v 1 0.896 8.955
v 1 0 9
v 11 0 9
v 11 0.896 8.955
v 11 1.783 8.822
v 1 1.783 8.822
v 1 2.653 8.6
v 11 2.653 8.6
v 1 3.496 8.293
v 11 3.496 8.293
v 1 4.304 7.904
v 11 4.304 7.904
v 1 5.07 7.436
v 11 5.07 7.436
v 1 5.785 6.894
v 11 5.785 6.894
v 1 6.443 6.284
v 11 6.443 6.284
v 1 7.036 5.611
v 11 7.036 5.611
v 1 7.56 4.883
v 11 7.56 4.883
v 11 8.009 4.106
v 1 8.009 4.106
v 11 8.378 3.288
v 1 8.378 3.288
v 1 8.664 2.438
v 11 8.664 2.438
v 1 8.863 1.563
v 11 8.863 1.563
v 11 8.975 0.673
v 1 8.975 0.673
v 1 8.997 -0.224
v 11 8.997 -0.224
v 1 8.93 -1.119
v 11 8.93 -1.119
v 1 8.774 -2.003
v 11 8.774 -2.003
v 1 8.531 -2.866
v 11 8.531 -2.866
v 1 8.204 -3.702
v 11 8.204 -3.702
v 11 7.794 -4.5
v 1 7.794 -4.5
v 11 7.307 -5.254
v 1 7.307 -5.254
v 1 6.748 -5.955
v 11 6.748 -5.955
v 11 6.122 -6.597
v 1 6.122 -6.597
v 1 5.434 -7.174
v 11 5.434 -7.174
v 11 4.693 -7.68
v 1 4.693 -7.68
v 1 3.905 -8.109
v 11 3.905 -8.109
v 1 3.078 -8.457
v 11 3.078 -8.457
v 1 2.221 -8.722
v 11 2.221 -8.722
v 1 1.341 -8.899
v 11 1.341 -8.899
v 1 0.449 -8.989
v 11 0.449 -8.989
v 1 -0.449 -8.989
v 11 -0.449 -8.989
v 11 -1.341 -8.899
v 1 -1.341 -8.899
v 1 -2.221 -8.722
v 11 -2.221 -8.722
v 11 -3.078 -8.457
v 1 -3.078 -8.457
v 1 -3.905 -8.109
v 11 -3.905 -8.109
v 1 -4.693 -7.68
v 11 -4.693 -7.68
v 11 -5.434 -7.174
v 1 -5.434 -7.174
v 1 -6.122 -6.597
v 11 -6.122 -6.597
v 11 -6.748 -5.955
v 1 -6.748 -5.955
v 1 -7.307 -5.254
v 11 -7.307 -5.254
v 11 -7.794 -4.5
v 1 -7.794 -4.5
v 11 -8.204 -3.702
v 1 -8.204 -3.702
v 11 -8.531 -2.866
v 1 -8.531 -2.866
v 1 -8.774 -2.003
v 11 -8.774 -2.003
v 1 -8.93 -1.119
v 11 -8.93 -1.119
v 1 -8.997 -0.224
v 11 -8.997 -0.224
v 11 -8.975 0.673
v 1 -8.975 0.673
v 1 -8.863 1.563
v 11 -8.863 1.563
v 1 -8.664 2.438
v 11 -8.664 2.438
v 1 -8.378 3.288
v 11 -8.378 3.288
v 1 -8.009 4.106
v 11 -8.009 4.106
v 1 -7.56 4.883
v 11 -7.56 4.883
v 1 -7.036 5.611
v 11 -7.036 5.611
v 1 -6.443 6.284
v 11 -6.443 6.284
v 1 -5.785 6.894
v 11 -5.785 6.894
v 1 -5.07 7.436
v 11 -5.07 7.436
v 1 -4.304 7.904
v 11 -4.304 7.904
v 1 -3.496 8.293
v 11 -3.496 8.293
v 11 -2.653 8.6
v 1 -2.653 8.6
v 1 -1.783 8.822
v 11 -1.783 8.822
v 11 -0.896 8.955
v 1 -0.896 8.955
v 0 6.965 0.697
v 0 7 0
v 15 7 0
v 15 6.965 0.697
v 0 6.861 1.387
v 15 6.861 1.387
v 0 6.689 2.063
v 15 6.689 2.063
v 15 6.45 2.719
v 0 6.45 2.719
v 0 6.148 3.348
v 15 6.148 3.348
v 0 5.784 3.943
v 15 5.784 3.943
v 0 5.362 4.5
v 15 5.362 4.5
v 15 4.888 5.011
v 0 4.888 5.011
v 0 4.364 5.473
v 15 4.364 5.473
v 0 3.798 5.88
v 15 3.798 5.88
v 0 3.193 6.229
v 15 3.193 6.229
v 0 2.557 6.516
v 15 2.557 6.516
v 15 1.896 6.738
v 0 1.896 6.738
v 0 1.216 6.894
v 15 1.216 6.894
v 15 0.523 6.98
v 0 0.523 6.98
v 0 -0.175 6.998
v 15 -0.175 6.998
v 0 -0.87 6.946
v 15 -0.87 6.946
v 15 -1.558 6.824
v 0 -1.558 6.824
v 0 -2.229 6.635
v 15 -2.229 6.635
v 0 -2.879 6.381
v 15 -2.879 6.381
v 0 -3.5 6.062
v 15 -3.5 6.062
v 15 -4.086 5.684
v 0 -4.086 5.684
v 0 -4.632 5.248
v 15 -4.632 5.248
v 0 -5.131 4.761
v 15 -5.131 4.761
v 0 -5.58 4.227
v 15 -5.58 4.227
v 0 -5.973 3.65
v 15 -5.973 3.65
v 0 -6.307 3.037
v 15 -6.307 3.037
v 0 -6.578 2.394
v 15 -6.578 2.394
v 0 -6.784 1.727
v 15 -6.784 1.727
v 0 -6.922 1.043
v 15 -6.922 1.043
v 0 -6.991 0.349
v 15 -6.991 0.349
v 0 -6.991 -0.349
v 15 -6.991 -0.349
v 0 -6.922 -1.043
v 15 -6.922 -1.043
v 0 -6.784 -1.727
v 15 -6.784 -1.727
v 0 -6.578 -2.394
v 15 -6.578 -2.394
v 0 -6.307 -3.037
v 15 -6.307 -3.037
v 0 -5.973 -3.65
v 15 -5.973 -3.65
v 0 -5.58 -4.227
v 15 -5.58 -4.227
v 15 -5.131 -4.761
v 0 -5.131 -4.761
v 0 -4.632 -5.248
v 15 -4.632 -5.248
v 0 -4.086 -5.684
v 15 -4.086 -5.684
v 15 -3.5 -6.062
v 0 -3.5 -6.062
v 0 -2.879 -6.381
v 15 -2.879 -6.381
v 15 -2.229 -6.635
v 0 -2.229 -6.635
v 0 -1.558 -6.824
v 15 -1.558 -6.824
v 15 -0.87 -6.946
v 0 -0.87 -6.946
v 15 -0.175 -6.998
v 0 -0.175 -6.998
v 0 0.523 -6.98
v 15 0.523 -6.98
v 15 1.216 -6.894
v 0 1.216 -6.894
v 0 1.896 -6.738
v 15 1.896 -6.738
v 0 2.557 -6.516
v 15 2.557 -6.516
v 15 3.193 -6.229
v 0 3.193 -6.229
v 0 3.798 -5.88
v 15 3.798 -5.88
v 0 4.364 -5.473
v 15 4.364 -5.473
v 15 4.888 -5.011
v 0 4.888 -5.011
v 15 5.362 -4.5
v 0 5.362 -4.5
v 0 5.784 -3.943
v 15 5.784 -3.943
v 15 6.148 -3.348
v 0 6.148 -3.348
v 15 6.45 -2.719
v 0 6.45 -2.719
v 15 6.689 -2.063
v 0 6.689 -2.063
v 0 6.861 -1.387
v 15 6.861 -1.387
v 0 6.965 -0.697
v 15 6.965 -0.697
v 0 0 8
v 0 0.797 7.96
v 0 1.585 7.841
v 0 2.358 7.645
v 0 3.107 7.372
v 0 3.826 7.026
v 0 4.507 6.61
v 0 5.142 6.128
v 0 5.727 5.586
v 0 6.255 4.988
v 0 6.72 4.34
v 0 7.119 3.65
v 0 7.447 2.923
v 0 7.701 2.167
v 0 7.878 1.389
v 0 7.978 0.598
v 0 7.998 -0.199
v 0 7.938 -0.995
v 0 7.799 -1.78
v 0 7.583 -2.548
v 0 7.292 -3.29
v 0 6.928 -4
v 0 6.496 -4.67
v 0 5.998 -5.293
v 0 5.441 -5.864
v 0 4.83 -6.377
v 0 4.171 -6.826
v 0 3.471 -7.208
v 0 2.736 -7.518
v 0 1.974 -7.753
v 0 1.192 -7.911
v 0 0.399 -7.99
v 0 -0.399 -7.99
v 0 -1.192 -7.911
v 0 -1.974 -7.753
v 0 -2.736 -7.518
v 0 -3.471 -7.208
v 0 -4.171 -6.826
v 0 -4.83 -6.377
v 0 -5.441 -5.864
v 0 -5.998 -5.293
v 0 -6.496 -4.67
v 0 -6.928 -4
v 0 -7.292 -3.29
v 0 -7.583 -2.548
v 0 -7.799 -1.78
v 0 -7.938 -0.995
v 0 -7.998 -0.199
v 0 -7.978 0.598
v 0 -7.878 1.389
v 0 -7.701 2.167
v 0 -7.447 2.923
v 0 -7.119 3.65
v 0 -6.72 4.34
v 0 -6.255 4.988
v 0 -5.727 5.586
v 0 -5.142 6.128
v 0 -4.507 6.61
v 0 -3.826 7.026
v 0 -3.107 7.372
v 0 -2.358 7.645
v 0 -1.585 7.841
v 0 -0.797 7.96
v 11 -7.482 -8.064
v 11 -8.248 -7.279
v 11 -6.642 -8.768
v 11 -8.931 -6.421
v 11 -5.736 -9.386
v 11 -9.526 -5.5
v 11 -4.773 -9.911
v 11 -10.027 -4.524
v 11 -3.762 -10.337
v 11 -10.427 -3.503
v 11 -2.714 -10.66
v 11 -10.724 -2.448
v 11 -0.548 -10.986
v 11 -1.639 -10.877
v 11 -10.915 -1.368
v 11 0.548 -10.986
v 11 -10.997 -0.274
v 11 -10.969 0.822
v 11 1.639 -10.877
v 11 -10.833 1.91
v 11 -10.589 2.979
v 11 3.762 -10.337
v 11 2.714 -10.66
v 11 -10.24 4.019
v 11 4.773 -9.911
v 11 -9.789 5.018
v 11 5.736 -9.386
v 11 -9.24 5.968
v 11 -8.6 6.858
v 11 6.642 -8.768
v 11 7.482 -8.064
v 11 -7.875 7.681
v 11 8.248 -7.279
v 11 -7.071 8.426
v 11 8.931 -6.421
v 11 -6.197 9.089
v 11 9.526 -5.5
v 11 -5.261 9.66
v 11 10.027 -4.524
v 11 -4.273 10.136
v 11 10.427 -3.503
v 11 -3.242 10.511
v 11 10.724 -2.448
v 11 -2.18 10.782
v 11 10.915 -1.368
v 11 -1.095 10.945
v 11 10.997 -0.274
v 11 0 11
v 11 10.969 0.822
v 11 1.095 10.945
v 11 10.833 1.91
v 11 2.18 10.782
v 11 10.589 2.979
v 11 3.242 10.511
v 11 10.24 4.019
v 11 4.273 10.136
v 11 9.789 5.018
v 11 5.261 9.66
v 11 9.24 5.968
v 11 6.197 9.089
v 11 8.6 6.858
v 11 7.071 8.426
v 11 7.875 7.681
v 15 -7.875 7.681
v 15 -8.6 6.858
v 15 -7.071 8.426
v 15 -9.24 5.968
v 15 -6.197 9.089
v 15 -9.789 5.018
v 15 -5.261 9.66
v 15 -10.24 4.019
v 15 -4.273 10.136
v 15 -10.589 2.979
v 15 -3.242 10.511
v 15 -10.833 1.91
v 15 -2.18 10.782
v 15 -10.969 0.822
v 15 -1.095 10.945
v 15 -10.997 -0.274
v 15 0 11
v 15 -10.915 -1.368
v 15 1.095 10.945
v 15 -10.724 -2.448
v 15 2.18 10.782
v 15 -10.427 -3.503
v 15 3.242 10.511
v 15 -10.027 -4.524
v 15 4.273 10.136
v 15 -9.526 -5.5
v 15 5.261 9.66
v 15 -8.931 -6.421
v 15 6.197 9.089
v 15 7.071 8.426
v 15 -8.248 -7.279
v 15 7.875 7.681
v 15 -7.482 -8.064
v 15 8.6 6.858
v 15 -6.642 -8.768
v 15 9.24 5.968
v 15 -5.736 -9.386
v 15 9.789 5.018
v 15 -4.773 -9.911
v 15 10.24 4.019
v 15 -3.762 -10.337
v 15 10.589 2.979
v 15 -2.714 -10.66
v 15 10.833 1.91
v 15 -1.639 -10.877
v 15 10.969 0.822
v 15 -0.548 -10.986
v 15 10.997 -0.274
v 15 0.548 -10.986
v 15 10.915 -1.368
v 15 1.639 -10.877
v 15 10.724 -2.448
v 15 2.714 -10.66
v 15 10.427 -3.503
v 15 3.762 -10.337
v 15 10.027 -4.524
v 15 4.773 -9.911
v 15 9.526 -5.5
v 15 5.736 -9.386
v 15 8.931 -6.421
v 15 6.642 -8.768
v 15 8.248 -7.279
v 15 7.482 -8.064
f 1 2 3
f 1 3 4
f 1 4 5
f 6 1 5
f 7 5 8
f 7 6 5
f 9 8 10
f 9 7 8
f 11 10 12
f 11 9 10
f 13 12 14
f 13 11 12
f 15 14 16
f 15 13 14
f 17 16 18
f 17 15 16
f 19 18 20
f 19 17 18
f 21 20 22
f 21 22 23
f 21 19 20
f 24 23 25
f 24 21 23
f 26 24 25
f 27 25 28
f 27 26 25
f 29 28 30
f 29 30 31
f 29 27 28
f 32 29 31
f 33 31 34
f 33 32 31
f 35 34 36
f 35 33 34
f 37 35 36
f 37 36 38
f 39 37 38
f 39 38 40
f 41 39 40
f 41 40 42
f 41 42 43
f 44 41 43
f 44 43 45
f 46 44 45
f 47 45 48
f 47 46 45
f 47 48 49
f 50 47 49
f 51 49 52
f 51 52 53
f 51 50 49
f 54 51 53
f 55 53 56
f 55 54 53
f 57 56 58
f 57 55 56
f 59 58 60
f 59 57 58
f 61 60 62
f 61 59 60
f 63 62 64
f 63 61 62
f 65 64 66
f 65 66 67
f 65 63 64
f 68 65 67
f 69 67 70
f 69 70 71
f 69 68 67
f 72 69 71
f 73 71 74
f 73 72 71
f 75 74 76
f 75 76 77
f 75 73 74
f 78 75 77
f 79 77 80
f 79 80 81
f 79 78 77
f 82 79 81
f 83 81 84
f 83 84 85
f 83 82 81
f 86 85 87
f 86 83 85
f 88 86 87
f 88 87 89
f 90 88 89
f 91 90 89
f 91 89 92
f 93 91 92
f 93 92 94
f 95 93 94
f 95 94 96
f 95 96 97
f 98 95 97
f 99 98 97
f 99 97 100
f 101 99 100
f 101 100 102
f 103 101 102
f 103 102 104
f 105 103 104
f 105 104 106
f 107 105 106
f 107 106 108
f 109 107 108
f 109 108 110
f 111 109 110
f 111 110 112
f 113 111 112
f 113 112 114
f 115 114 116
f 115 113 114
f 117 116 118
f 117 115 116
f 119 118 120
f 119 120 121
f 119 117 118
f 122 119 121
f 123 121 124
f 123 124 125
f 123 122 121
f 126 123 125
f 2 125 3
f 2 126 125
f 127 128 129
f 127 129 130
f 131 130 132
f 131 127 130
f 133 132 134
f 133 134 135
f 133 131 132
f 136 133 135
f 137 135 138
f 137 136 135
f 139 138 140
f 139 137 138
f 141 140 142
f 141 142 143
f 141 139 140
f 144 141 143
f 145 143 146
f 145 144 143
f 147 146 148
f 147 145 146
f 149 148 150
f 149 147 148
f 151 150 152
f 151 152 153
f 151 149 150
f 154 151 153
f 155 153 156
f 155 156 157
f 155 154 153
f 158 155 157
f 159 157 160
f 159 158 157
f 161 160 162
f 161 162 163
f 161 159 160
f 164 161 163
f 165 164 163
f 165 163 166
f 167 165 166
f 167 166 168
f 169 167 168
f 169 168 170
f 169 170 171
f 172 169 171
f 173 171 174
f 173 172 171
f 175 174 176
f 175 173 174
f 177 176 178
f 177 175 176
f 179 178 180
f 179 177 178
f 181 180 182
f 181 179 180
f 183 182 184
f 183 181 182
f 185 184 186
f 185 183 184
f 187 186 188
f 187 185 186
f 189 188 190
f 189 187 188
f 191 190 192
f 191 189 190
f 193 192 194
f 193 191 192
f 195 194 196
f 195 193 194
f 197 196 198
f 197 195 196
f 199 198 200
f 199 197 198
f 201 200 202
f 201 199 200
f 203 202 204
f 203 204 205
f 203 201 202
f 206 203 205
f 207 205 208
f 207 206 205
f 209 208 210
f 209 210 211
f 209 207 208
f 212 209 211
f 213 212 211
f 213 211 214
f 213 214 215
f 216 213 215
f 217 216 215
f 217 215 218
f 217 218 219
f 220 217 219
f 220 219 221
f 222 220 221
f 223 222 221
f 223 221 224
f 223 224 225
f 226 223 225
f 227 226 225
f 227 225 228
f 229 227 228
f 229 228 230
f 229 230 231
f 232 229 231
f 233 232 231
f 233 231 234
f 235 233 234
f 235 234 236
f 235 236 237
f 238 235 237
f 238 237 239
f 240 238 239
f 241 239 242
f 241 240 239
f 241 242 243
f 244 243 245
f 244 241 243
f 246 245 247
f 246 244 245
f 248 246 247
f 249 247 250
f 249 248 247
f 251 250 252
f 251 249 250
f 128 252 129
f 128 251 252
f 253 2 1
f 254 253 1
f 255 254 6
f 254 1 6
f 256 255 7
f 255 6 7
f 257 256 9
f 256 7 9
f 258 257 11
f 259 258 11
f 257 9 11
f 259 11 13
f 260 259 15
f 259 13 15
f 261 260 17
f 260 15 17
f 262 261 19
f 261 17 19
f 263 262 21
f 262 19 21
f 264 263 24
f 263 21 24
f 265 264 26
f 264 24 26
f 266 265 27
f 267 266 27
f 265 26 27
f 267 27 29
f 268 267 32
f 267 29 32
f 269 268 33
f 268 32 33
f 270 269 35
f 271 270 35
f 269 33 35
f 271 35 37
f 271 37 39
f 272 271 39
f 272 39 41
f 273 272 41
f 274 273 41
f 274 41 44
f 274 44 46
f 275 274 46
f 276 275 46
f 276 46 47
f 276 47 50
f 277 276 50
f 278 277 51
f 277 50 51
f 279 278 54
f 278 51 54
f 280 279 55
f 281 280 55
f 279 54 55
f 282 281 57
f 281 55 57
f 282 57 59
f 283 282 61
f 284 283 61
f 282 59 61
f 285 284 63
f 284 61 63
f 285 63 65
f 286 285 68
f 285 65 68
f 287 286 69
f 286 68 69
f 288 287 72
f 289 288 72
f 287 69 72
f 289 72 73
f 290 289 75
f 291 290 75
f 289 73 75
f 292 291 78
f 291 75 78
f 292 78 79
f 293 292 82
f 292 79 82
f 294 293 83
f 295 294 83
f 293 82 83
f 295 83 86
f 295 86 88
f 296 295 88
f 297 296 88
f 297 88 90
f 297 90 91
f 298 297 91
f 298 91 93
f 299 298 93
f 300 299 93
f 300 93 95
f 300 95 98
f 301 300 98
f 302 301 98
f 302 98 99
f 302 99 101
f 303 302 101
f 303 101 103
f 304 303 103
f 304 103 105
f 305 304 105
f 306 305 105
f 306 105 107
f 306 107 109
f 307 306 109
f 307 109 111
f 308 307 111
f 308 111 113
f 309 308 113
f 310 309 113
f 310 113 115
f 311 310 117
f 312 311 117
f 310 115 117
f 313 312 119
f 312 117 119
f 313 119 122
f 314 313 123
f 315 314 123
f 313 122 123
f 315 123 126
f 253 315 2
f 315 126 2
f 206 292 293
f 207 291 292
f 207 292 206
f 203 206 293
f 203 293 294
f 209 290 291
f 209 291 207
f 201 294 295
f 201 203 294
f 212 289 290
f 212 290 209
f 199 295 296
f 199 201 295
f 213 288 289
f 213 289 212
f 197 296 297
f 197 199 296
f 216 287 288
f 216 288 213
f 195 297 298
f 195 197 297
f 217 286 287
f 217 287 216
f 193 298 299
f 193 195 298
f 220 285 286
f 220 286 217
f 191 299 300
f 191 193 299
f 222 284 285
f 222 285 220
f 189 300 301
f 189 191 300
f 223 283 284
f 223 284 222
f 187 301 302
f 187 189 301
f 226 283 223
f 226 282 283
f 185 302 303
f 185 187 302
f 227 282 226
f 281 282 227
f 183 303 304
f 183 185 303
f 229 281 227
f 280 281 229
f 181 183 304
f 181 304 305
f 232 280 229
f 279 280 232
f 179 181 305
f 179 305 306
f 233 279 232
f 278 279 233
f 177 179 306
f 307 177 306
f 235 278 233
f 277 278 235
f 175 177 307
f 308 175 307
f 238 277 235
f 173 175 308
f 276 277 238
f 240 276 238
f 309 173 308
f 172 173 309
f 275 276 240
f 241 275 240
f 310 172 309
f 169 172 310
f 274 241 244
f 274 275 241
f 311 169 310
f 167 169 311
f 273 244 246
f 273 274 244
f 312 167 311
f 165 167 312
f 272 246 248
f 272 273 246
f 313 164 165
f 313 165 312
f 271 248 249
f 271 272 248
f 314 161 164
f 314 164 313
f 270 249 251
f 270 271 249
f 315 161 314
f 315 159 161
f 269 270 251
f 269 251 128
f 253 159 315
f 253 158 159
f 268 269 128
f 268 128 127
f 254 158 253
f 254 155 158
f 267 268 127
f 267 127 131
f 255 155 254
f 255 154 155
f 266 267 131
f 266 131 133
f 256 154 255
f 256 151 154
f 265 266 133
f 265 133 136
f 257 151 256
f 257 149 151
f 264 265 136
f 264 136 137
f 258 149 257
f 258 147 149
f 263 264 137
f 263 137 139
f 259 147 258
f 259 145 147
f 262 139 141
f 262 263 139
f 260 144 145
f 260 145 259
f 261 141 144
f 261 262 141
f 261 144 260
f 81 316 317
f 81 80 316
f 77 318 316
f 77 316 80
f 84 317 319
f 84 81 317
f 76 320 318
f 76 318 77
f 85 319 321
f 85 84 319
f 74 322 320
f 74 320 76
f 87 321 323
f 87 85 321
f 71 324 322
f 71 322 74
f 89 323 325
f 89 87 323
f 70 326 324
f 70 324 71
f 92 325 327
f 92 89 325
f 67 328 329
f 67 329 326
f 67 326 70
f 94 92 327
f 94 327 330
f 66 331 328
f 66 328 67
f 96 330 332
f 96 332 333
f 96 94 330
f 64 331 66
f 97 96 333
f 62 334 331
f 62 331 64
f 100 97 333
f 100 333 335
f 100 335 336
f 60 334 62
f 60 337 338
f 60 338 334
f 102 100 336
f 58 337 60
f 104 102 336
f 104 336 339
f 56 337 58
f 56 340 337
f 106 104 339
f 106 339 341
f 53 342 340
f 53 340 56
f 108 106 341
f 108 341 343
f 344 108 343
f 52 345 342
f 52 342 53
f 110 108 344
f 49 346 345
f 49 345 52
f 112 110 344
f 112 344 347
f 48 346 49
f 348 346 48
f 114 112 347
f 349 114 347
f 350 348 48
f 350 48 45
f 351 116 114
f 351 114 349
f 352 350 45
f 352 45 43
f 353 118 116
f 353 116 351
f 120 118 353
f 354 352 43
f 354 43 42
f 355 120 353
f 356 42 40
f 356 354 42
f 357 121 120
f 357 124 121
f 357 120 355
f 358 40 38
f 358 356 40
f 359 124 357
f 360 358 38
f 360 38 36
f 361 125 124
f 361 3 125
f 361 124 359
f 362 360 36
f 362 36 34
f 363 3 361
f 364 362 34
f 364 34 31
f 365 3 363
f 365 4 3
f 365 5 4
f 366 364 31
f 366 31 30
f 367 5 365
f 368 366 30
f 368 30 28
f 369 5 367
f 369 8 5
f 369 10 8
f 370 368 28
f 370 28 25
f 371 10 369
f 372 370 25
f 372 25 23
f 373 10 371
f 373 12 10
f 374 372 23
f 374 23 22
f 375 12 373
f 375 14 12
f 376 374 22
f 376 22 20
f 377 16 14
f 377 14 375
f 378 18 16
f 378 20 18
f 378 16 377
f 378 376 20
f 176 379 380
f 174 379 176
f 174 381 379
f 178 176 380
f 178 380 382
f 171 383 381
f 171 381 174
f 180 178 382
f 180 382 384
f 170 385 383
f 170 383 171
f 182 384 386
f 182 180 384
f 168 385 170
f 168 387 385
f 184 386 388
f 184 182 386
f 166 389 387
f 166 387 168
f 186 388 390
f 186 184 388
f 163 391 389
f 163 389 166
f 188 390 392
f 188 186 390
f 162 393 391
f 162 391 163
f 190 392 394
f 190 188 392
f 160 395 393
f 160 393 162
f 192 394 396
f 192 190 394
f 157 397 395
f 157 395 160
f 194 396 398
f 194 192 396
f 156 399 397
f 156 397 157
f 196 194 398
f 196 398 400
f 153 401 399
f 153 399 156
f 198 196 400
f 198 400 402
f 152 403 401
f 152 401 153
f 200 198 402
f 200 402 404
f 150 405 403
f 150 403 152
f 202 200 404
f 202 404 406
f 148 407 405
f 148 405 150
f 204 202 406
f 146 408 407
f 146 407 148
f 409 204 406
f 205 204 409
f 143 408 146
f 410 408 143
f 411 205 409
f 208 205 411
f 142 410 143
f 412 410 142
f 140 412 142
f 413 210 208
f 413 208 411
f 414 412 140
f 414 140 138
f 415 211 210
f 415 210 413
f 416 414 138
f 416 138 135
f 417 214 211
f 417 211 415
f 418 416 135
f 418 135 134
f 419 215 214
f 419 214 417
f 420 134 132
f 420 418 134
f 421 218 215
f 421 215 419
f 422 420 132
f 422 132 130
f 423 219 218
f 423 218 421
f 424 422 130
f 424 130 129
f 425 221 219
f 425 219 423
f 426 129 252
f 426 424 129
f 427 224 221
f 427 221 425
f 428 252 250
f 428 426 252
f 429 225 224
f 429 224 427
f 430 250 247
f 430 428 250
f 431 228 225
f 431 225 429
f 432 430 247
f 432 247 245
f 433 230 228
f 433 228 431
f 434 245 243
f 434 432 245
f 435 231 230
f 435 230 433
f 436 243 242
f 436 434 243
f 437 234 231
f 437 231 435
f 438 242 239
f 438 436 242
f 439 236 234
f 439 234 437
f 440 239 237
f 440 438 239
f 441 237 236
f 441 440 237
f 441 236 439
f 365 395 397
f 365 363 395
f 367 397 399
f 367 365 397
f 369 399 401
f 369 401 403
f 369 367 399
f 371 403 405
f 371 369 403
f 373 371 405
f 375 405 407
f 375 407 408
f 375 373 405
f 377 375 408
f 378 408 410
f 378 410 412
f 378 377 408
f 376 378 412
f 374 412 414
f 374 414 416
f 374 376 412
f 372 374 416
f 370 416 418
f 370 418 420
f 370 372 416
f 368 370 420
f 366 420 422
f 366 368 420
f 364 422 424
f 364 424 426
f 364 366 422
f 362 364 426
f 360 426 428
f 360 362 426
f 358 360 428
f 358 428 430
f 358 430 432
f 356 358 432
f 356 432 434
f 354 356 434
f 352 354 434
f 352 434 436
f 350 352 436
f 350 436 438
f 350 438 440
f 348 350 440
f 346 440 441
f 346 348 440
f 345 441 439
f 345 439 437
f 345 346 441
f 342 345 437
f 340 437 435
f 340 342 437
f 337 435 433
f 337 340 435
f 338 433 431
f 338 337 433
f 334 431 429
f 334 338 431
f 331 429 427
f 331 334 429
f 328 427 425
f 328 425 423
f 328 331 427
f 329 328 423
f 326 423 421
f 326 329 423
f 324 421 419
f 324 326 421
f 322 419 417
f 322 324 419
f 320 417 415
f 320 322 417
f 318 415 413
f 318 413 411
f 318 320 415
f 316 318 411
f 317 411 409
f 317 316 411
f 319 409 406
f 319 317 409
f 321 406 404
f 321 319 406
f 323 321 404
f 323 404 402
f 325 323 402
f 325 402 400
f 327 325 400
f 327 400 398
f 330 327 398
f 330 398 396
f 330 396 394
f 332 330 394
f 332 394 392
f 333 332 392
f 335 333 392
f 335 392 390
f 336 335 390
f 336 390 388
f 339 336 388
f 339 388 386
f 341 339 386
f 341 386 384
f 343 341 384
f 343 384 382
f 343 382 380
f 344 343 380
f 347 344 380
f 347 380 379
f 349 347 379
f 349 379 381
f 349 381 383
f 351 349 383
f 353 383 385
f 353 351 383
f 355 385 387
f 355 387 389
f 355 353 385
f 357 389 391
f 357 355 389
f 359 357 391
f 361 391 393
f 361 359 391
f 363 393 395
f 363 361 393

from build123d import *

# Parameters (mm, degrees)
F2_R     = 7
F3_DEPTH = 15
F4_SIZE  = 1


with BuildPart() as f1:
    # F0 (on Front) → F1 (revolve)
    with BuildSketch(Plane.XZ):
        Polygon((0, 9), (0, 0), (15, 0), (15, 11), (11, 11), (11, 9), align=None)
    revolve(axis=Axis((7.5, 0, 0), (-1, 0, 0)))

    # F2 (on Right) → F3 (cut)
    with BuildSketch(Plane.YZ):
        Circle(F2_R)
    extrude(amount=F3_DEPTH, mode=Mode.SUBTRACT)

    # F4
    f4_edges = [f1.edges().sort_by_distance(p)[0] for p in [
        (0, 0, -9),
    ]]
    chamfer(f4_edges, length=F4_SIZE)


solid = f1.part
